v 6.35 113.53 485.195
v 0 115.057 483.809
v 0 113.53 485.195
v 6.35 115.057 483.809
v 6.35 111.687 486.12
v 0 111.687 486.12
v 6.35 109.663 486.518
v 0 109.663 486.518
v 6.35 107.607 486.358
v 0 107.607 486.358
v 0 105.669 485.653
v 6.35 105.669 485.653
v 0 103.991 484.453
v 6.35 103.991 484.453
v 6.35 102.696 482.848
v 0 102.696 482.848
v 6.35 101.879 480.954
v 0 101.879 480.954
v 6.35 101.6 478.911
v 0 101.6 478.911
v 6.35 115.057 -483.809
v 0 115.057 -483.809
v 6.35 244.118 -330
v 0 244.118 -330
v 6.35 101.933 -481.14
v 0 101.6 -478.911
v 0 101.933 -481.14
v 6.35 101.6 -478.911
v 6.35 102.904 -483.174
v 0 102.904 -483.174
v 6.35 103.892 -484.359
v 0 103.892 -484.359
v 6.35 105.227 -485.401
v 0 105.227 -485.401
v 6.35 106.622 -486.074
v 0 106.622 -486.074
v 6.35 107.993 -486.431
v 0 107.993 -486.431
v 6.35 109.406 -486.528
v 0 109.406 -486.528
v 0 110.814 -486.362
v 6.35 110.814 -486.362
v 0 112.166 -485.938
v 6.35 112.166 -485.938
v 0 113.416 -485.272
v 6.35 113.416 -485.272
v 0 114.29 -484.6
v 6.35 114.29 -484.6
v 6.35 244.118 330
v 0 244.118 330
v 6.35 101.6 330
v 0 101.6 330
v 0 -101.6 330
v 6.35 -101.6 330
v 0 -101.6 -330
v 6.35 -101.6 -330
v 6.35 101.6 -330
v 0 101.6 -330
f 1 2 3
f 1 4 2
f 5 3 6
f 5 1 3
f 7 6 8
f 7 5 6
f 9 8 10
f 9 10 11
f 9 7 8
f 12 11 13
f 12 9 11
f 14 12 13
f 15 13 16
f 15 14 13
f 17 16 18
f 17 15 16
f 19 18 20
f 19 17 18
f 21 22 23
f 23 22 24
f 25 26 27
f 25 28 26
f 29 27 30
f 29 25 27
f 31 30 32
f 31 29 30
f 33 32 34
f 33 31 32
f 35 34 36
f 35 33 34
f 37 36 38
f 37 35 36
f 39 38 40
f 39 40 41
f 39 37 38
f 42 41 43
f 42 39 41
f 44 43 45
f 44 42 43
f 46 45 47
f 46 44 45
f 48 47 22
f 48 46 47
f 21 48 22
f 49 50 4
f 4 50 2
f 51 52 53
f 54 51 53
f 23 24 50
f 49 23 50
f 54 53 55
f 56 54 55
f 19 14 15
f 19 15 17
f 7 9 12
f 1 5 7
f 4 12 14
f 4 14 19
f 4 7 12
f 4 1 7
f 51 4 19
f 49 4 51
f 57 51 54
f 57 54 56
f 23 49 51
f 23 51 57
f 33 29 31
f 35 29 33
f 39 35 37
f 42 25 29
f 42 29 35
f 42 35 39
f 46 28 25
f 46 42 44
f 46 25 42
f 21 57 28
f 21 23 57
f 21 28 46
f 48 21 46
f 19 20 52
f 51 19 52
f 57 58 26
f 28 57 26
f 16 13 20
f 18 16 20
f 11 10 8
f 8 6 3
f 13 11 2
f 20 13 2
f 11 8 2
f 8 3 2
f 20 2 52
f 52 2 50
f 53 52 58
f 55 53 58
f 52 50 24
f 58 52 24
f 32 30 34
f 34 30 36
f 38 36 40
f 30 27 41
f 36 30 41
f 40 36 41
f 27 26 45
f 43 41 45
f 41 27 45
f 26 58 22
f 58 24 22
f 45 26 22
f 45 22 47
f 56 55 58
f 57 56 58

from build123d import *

# Parameters (mm, degrees)
BOSS_EXTRUDE1_DEPTH = 6.35
FILLET1_R           = 7.62


with BuildPart() as part:
    # Sketch1 → Boss-Extrude1 (new body)
    with BuildSketch(Plane(origin=(0, 0, 0), x_dir=(0, 0, -1), z_dir=(1, 0, 0))):
        Polygon((330, 101.6), (482.4, 101.6), (499.846481614, 101.6), (486.481701322, 112.814382214), (330, 244.118120079), (-330, 244.118120079), (-499.846481614, 101.6), (-482.4, 101.6), (-330, 101.6), (-330, -101.6), (330, -101.6), align=None)
    extrude(amount=BOSS_EXTRUDE1_DEPTH)

    # Fillet1
    fillet1_edges = [part.edges().sort_by_distance(p)[0] for p in [
        (3.175, 101.6, 499.846481614),
        (3.175, 101.6, -499.846481614),
    ]]
    fillet(fillet1_edges, radius=FILLET1_R)


solid = part.part
